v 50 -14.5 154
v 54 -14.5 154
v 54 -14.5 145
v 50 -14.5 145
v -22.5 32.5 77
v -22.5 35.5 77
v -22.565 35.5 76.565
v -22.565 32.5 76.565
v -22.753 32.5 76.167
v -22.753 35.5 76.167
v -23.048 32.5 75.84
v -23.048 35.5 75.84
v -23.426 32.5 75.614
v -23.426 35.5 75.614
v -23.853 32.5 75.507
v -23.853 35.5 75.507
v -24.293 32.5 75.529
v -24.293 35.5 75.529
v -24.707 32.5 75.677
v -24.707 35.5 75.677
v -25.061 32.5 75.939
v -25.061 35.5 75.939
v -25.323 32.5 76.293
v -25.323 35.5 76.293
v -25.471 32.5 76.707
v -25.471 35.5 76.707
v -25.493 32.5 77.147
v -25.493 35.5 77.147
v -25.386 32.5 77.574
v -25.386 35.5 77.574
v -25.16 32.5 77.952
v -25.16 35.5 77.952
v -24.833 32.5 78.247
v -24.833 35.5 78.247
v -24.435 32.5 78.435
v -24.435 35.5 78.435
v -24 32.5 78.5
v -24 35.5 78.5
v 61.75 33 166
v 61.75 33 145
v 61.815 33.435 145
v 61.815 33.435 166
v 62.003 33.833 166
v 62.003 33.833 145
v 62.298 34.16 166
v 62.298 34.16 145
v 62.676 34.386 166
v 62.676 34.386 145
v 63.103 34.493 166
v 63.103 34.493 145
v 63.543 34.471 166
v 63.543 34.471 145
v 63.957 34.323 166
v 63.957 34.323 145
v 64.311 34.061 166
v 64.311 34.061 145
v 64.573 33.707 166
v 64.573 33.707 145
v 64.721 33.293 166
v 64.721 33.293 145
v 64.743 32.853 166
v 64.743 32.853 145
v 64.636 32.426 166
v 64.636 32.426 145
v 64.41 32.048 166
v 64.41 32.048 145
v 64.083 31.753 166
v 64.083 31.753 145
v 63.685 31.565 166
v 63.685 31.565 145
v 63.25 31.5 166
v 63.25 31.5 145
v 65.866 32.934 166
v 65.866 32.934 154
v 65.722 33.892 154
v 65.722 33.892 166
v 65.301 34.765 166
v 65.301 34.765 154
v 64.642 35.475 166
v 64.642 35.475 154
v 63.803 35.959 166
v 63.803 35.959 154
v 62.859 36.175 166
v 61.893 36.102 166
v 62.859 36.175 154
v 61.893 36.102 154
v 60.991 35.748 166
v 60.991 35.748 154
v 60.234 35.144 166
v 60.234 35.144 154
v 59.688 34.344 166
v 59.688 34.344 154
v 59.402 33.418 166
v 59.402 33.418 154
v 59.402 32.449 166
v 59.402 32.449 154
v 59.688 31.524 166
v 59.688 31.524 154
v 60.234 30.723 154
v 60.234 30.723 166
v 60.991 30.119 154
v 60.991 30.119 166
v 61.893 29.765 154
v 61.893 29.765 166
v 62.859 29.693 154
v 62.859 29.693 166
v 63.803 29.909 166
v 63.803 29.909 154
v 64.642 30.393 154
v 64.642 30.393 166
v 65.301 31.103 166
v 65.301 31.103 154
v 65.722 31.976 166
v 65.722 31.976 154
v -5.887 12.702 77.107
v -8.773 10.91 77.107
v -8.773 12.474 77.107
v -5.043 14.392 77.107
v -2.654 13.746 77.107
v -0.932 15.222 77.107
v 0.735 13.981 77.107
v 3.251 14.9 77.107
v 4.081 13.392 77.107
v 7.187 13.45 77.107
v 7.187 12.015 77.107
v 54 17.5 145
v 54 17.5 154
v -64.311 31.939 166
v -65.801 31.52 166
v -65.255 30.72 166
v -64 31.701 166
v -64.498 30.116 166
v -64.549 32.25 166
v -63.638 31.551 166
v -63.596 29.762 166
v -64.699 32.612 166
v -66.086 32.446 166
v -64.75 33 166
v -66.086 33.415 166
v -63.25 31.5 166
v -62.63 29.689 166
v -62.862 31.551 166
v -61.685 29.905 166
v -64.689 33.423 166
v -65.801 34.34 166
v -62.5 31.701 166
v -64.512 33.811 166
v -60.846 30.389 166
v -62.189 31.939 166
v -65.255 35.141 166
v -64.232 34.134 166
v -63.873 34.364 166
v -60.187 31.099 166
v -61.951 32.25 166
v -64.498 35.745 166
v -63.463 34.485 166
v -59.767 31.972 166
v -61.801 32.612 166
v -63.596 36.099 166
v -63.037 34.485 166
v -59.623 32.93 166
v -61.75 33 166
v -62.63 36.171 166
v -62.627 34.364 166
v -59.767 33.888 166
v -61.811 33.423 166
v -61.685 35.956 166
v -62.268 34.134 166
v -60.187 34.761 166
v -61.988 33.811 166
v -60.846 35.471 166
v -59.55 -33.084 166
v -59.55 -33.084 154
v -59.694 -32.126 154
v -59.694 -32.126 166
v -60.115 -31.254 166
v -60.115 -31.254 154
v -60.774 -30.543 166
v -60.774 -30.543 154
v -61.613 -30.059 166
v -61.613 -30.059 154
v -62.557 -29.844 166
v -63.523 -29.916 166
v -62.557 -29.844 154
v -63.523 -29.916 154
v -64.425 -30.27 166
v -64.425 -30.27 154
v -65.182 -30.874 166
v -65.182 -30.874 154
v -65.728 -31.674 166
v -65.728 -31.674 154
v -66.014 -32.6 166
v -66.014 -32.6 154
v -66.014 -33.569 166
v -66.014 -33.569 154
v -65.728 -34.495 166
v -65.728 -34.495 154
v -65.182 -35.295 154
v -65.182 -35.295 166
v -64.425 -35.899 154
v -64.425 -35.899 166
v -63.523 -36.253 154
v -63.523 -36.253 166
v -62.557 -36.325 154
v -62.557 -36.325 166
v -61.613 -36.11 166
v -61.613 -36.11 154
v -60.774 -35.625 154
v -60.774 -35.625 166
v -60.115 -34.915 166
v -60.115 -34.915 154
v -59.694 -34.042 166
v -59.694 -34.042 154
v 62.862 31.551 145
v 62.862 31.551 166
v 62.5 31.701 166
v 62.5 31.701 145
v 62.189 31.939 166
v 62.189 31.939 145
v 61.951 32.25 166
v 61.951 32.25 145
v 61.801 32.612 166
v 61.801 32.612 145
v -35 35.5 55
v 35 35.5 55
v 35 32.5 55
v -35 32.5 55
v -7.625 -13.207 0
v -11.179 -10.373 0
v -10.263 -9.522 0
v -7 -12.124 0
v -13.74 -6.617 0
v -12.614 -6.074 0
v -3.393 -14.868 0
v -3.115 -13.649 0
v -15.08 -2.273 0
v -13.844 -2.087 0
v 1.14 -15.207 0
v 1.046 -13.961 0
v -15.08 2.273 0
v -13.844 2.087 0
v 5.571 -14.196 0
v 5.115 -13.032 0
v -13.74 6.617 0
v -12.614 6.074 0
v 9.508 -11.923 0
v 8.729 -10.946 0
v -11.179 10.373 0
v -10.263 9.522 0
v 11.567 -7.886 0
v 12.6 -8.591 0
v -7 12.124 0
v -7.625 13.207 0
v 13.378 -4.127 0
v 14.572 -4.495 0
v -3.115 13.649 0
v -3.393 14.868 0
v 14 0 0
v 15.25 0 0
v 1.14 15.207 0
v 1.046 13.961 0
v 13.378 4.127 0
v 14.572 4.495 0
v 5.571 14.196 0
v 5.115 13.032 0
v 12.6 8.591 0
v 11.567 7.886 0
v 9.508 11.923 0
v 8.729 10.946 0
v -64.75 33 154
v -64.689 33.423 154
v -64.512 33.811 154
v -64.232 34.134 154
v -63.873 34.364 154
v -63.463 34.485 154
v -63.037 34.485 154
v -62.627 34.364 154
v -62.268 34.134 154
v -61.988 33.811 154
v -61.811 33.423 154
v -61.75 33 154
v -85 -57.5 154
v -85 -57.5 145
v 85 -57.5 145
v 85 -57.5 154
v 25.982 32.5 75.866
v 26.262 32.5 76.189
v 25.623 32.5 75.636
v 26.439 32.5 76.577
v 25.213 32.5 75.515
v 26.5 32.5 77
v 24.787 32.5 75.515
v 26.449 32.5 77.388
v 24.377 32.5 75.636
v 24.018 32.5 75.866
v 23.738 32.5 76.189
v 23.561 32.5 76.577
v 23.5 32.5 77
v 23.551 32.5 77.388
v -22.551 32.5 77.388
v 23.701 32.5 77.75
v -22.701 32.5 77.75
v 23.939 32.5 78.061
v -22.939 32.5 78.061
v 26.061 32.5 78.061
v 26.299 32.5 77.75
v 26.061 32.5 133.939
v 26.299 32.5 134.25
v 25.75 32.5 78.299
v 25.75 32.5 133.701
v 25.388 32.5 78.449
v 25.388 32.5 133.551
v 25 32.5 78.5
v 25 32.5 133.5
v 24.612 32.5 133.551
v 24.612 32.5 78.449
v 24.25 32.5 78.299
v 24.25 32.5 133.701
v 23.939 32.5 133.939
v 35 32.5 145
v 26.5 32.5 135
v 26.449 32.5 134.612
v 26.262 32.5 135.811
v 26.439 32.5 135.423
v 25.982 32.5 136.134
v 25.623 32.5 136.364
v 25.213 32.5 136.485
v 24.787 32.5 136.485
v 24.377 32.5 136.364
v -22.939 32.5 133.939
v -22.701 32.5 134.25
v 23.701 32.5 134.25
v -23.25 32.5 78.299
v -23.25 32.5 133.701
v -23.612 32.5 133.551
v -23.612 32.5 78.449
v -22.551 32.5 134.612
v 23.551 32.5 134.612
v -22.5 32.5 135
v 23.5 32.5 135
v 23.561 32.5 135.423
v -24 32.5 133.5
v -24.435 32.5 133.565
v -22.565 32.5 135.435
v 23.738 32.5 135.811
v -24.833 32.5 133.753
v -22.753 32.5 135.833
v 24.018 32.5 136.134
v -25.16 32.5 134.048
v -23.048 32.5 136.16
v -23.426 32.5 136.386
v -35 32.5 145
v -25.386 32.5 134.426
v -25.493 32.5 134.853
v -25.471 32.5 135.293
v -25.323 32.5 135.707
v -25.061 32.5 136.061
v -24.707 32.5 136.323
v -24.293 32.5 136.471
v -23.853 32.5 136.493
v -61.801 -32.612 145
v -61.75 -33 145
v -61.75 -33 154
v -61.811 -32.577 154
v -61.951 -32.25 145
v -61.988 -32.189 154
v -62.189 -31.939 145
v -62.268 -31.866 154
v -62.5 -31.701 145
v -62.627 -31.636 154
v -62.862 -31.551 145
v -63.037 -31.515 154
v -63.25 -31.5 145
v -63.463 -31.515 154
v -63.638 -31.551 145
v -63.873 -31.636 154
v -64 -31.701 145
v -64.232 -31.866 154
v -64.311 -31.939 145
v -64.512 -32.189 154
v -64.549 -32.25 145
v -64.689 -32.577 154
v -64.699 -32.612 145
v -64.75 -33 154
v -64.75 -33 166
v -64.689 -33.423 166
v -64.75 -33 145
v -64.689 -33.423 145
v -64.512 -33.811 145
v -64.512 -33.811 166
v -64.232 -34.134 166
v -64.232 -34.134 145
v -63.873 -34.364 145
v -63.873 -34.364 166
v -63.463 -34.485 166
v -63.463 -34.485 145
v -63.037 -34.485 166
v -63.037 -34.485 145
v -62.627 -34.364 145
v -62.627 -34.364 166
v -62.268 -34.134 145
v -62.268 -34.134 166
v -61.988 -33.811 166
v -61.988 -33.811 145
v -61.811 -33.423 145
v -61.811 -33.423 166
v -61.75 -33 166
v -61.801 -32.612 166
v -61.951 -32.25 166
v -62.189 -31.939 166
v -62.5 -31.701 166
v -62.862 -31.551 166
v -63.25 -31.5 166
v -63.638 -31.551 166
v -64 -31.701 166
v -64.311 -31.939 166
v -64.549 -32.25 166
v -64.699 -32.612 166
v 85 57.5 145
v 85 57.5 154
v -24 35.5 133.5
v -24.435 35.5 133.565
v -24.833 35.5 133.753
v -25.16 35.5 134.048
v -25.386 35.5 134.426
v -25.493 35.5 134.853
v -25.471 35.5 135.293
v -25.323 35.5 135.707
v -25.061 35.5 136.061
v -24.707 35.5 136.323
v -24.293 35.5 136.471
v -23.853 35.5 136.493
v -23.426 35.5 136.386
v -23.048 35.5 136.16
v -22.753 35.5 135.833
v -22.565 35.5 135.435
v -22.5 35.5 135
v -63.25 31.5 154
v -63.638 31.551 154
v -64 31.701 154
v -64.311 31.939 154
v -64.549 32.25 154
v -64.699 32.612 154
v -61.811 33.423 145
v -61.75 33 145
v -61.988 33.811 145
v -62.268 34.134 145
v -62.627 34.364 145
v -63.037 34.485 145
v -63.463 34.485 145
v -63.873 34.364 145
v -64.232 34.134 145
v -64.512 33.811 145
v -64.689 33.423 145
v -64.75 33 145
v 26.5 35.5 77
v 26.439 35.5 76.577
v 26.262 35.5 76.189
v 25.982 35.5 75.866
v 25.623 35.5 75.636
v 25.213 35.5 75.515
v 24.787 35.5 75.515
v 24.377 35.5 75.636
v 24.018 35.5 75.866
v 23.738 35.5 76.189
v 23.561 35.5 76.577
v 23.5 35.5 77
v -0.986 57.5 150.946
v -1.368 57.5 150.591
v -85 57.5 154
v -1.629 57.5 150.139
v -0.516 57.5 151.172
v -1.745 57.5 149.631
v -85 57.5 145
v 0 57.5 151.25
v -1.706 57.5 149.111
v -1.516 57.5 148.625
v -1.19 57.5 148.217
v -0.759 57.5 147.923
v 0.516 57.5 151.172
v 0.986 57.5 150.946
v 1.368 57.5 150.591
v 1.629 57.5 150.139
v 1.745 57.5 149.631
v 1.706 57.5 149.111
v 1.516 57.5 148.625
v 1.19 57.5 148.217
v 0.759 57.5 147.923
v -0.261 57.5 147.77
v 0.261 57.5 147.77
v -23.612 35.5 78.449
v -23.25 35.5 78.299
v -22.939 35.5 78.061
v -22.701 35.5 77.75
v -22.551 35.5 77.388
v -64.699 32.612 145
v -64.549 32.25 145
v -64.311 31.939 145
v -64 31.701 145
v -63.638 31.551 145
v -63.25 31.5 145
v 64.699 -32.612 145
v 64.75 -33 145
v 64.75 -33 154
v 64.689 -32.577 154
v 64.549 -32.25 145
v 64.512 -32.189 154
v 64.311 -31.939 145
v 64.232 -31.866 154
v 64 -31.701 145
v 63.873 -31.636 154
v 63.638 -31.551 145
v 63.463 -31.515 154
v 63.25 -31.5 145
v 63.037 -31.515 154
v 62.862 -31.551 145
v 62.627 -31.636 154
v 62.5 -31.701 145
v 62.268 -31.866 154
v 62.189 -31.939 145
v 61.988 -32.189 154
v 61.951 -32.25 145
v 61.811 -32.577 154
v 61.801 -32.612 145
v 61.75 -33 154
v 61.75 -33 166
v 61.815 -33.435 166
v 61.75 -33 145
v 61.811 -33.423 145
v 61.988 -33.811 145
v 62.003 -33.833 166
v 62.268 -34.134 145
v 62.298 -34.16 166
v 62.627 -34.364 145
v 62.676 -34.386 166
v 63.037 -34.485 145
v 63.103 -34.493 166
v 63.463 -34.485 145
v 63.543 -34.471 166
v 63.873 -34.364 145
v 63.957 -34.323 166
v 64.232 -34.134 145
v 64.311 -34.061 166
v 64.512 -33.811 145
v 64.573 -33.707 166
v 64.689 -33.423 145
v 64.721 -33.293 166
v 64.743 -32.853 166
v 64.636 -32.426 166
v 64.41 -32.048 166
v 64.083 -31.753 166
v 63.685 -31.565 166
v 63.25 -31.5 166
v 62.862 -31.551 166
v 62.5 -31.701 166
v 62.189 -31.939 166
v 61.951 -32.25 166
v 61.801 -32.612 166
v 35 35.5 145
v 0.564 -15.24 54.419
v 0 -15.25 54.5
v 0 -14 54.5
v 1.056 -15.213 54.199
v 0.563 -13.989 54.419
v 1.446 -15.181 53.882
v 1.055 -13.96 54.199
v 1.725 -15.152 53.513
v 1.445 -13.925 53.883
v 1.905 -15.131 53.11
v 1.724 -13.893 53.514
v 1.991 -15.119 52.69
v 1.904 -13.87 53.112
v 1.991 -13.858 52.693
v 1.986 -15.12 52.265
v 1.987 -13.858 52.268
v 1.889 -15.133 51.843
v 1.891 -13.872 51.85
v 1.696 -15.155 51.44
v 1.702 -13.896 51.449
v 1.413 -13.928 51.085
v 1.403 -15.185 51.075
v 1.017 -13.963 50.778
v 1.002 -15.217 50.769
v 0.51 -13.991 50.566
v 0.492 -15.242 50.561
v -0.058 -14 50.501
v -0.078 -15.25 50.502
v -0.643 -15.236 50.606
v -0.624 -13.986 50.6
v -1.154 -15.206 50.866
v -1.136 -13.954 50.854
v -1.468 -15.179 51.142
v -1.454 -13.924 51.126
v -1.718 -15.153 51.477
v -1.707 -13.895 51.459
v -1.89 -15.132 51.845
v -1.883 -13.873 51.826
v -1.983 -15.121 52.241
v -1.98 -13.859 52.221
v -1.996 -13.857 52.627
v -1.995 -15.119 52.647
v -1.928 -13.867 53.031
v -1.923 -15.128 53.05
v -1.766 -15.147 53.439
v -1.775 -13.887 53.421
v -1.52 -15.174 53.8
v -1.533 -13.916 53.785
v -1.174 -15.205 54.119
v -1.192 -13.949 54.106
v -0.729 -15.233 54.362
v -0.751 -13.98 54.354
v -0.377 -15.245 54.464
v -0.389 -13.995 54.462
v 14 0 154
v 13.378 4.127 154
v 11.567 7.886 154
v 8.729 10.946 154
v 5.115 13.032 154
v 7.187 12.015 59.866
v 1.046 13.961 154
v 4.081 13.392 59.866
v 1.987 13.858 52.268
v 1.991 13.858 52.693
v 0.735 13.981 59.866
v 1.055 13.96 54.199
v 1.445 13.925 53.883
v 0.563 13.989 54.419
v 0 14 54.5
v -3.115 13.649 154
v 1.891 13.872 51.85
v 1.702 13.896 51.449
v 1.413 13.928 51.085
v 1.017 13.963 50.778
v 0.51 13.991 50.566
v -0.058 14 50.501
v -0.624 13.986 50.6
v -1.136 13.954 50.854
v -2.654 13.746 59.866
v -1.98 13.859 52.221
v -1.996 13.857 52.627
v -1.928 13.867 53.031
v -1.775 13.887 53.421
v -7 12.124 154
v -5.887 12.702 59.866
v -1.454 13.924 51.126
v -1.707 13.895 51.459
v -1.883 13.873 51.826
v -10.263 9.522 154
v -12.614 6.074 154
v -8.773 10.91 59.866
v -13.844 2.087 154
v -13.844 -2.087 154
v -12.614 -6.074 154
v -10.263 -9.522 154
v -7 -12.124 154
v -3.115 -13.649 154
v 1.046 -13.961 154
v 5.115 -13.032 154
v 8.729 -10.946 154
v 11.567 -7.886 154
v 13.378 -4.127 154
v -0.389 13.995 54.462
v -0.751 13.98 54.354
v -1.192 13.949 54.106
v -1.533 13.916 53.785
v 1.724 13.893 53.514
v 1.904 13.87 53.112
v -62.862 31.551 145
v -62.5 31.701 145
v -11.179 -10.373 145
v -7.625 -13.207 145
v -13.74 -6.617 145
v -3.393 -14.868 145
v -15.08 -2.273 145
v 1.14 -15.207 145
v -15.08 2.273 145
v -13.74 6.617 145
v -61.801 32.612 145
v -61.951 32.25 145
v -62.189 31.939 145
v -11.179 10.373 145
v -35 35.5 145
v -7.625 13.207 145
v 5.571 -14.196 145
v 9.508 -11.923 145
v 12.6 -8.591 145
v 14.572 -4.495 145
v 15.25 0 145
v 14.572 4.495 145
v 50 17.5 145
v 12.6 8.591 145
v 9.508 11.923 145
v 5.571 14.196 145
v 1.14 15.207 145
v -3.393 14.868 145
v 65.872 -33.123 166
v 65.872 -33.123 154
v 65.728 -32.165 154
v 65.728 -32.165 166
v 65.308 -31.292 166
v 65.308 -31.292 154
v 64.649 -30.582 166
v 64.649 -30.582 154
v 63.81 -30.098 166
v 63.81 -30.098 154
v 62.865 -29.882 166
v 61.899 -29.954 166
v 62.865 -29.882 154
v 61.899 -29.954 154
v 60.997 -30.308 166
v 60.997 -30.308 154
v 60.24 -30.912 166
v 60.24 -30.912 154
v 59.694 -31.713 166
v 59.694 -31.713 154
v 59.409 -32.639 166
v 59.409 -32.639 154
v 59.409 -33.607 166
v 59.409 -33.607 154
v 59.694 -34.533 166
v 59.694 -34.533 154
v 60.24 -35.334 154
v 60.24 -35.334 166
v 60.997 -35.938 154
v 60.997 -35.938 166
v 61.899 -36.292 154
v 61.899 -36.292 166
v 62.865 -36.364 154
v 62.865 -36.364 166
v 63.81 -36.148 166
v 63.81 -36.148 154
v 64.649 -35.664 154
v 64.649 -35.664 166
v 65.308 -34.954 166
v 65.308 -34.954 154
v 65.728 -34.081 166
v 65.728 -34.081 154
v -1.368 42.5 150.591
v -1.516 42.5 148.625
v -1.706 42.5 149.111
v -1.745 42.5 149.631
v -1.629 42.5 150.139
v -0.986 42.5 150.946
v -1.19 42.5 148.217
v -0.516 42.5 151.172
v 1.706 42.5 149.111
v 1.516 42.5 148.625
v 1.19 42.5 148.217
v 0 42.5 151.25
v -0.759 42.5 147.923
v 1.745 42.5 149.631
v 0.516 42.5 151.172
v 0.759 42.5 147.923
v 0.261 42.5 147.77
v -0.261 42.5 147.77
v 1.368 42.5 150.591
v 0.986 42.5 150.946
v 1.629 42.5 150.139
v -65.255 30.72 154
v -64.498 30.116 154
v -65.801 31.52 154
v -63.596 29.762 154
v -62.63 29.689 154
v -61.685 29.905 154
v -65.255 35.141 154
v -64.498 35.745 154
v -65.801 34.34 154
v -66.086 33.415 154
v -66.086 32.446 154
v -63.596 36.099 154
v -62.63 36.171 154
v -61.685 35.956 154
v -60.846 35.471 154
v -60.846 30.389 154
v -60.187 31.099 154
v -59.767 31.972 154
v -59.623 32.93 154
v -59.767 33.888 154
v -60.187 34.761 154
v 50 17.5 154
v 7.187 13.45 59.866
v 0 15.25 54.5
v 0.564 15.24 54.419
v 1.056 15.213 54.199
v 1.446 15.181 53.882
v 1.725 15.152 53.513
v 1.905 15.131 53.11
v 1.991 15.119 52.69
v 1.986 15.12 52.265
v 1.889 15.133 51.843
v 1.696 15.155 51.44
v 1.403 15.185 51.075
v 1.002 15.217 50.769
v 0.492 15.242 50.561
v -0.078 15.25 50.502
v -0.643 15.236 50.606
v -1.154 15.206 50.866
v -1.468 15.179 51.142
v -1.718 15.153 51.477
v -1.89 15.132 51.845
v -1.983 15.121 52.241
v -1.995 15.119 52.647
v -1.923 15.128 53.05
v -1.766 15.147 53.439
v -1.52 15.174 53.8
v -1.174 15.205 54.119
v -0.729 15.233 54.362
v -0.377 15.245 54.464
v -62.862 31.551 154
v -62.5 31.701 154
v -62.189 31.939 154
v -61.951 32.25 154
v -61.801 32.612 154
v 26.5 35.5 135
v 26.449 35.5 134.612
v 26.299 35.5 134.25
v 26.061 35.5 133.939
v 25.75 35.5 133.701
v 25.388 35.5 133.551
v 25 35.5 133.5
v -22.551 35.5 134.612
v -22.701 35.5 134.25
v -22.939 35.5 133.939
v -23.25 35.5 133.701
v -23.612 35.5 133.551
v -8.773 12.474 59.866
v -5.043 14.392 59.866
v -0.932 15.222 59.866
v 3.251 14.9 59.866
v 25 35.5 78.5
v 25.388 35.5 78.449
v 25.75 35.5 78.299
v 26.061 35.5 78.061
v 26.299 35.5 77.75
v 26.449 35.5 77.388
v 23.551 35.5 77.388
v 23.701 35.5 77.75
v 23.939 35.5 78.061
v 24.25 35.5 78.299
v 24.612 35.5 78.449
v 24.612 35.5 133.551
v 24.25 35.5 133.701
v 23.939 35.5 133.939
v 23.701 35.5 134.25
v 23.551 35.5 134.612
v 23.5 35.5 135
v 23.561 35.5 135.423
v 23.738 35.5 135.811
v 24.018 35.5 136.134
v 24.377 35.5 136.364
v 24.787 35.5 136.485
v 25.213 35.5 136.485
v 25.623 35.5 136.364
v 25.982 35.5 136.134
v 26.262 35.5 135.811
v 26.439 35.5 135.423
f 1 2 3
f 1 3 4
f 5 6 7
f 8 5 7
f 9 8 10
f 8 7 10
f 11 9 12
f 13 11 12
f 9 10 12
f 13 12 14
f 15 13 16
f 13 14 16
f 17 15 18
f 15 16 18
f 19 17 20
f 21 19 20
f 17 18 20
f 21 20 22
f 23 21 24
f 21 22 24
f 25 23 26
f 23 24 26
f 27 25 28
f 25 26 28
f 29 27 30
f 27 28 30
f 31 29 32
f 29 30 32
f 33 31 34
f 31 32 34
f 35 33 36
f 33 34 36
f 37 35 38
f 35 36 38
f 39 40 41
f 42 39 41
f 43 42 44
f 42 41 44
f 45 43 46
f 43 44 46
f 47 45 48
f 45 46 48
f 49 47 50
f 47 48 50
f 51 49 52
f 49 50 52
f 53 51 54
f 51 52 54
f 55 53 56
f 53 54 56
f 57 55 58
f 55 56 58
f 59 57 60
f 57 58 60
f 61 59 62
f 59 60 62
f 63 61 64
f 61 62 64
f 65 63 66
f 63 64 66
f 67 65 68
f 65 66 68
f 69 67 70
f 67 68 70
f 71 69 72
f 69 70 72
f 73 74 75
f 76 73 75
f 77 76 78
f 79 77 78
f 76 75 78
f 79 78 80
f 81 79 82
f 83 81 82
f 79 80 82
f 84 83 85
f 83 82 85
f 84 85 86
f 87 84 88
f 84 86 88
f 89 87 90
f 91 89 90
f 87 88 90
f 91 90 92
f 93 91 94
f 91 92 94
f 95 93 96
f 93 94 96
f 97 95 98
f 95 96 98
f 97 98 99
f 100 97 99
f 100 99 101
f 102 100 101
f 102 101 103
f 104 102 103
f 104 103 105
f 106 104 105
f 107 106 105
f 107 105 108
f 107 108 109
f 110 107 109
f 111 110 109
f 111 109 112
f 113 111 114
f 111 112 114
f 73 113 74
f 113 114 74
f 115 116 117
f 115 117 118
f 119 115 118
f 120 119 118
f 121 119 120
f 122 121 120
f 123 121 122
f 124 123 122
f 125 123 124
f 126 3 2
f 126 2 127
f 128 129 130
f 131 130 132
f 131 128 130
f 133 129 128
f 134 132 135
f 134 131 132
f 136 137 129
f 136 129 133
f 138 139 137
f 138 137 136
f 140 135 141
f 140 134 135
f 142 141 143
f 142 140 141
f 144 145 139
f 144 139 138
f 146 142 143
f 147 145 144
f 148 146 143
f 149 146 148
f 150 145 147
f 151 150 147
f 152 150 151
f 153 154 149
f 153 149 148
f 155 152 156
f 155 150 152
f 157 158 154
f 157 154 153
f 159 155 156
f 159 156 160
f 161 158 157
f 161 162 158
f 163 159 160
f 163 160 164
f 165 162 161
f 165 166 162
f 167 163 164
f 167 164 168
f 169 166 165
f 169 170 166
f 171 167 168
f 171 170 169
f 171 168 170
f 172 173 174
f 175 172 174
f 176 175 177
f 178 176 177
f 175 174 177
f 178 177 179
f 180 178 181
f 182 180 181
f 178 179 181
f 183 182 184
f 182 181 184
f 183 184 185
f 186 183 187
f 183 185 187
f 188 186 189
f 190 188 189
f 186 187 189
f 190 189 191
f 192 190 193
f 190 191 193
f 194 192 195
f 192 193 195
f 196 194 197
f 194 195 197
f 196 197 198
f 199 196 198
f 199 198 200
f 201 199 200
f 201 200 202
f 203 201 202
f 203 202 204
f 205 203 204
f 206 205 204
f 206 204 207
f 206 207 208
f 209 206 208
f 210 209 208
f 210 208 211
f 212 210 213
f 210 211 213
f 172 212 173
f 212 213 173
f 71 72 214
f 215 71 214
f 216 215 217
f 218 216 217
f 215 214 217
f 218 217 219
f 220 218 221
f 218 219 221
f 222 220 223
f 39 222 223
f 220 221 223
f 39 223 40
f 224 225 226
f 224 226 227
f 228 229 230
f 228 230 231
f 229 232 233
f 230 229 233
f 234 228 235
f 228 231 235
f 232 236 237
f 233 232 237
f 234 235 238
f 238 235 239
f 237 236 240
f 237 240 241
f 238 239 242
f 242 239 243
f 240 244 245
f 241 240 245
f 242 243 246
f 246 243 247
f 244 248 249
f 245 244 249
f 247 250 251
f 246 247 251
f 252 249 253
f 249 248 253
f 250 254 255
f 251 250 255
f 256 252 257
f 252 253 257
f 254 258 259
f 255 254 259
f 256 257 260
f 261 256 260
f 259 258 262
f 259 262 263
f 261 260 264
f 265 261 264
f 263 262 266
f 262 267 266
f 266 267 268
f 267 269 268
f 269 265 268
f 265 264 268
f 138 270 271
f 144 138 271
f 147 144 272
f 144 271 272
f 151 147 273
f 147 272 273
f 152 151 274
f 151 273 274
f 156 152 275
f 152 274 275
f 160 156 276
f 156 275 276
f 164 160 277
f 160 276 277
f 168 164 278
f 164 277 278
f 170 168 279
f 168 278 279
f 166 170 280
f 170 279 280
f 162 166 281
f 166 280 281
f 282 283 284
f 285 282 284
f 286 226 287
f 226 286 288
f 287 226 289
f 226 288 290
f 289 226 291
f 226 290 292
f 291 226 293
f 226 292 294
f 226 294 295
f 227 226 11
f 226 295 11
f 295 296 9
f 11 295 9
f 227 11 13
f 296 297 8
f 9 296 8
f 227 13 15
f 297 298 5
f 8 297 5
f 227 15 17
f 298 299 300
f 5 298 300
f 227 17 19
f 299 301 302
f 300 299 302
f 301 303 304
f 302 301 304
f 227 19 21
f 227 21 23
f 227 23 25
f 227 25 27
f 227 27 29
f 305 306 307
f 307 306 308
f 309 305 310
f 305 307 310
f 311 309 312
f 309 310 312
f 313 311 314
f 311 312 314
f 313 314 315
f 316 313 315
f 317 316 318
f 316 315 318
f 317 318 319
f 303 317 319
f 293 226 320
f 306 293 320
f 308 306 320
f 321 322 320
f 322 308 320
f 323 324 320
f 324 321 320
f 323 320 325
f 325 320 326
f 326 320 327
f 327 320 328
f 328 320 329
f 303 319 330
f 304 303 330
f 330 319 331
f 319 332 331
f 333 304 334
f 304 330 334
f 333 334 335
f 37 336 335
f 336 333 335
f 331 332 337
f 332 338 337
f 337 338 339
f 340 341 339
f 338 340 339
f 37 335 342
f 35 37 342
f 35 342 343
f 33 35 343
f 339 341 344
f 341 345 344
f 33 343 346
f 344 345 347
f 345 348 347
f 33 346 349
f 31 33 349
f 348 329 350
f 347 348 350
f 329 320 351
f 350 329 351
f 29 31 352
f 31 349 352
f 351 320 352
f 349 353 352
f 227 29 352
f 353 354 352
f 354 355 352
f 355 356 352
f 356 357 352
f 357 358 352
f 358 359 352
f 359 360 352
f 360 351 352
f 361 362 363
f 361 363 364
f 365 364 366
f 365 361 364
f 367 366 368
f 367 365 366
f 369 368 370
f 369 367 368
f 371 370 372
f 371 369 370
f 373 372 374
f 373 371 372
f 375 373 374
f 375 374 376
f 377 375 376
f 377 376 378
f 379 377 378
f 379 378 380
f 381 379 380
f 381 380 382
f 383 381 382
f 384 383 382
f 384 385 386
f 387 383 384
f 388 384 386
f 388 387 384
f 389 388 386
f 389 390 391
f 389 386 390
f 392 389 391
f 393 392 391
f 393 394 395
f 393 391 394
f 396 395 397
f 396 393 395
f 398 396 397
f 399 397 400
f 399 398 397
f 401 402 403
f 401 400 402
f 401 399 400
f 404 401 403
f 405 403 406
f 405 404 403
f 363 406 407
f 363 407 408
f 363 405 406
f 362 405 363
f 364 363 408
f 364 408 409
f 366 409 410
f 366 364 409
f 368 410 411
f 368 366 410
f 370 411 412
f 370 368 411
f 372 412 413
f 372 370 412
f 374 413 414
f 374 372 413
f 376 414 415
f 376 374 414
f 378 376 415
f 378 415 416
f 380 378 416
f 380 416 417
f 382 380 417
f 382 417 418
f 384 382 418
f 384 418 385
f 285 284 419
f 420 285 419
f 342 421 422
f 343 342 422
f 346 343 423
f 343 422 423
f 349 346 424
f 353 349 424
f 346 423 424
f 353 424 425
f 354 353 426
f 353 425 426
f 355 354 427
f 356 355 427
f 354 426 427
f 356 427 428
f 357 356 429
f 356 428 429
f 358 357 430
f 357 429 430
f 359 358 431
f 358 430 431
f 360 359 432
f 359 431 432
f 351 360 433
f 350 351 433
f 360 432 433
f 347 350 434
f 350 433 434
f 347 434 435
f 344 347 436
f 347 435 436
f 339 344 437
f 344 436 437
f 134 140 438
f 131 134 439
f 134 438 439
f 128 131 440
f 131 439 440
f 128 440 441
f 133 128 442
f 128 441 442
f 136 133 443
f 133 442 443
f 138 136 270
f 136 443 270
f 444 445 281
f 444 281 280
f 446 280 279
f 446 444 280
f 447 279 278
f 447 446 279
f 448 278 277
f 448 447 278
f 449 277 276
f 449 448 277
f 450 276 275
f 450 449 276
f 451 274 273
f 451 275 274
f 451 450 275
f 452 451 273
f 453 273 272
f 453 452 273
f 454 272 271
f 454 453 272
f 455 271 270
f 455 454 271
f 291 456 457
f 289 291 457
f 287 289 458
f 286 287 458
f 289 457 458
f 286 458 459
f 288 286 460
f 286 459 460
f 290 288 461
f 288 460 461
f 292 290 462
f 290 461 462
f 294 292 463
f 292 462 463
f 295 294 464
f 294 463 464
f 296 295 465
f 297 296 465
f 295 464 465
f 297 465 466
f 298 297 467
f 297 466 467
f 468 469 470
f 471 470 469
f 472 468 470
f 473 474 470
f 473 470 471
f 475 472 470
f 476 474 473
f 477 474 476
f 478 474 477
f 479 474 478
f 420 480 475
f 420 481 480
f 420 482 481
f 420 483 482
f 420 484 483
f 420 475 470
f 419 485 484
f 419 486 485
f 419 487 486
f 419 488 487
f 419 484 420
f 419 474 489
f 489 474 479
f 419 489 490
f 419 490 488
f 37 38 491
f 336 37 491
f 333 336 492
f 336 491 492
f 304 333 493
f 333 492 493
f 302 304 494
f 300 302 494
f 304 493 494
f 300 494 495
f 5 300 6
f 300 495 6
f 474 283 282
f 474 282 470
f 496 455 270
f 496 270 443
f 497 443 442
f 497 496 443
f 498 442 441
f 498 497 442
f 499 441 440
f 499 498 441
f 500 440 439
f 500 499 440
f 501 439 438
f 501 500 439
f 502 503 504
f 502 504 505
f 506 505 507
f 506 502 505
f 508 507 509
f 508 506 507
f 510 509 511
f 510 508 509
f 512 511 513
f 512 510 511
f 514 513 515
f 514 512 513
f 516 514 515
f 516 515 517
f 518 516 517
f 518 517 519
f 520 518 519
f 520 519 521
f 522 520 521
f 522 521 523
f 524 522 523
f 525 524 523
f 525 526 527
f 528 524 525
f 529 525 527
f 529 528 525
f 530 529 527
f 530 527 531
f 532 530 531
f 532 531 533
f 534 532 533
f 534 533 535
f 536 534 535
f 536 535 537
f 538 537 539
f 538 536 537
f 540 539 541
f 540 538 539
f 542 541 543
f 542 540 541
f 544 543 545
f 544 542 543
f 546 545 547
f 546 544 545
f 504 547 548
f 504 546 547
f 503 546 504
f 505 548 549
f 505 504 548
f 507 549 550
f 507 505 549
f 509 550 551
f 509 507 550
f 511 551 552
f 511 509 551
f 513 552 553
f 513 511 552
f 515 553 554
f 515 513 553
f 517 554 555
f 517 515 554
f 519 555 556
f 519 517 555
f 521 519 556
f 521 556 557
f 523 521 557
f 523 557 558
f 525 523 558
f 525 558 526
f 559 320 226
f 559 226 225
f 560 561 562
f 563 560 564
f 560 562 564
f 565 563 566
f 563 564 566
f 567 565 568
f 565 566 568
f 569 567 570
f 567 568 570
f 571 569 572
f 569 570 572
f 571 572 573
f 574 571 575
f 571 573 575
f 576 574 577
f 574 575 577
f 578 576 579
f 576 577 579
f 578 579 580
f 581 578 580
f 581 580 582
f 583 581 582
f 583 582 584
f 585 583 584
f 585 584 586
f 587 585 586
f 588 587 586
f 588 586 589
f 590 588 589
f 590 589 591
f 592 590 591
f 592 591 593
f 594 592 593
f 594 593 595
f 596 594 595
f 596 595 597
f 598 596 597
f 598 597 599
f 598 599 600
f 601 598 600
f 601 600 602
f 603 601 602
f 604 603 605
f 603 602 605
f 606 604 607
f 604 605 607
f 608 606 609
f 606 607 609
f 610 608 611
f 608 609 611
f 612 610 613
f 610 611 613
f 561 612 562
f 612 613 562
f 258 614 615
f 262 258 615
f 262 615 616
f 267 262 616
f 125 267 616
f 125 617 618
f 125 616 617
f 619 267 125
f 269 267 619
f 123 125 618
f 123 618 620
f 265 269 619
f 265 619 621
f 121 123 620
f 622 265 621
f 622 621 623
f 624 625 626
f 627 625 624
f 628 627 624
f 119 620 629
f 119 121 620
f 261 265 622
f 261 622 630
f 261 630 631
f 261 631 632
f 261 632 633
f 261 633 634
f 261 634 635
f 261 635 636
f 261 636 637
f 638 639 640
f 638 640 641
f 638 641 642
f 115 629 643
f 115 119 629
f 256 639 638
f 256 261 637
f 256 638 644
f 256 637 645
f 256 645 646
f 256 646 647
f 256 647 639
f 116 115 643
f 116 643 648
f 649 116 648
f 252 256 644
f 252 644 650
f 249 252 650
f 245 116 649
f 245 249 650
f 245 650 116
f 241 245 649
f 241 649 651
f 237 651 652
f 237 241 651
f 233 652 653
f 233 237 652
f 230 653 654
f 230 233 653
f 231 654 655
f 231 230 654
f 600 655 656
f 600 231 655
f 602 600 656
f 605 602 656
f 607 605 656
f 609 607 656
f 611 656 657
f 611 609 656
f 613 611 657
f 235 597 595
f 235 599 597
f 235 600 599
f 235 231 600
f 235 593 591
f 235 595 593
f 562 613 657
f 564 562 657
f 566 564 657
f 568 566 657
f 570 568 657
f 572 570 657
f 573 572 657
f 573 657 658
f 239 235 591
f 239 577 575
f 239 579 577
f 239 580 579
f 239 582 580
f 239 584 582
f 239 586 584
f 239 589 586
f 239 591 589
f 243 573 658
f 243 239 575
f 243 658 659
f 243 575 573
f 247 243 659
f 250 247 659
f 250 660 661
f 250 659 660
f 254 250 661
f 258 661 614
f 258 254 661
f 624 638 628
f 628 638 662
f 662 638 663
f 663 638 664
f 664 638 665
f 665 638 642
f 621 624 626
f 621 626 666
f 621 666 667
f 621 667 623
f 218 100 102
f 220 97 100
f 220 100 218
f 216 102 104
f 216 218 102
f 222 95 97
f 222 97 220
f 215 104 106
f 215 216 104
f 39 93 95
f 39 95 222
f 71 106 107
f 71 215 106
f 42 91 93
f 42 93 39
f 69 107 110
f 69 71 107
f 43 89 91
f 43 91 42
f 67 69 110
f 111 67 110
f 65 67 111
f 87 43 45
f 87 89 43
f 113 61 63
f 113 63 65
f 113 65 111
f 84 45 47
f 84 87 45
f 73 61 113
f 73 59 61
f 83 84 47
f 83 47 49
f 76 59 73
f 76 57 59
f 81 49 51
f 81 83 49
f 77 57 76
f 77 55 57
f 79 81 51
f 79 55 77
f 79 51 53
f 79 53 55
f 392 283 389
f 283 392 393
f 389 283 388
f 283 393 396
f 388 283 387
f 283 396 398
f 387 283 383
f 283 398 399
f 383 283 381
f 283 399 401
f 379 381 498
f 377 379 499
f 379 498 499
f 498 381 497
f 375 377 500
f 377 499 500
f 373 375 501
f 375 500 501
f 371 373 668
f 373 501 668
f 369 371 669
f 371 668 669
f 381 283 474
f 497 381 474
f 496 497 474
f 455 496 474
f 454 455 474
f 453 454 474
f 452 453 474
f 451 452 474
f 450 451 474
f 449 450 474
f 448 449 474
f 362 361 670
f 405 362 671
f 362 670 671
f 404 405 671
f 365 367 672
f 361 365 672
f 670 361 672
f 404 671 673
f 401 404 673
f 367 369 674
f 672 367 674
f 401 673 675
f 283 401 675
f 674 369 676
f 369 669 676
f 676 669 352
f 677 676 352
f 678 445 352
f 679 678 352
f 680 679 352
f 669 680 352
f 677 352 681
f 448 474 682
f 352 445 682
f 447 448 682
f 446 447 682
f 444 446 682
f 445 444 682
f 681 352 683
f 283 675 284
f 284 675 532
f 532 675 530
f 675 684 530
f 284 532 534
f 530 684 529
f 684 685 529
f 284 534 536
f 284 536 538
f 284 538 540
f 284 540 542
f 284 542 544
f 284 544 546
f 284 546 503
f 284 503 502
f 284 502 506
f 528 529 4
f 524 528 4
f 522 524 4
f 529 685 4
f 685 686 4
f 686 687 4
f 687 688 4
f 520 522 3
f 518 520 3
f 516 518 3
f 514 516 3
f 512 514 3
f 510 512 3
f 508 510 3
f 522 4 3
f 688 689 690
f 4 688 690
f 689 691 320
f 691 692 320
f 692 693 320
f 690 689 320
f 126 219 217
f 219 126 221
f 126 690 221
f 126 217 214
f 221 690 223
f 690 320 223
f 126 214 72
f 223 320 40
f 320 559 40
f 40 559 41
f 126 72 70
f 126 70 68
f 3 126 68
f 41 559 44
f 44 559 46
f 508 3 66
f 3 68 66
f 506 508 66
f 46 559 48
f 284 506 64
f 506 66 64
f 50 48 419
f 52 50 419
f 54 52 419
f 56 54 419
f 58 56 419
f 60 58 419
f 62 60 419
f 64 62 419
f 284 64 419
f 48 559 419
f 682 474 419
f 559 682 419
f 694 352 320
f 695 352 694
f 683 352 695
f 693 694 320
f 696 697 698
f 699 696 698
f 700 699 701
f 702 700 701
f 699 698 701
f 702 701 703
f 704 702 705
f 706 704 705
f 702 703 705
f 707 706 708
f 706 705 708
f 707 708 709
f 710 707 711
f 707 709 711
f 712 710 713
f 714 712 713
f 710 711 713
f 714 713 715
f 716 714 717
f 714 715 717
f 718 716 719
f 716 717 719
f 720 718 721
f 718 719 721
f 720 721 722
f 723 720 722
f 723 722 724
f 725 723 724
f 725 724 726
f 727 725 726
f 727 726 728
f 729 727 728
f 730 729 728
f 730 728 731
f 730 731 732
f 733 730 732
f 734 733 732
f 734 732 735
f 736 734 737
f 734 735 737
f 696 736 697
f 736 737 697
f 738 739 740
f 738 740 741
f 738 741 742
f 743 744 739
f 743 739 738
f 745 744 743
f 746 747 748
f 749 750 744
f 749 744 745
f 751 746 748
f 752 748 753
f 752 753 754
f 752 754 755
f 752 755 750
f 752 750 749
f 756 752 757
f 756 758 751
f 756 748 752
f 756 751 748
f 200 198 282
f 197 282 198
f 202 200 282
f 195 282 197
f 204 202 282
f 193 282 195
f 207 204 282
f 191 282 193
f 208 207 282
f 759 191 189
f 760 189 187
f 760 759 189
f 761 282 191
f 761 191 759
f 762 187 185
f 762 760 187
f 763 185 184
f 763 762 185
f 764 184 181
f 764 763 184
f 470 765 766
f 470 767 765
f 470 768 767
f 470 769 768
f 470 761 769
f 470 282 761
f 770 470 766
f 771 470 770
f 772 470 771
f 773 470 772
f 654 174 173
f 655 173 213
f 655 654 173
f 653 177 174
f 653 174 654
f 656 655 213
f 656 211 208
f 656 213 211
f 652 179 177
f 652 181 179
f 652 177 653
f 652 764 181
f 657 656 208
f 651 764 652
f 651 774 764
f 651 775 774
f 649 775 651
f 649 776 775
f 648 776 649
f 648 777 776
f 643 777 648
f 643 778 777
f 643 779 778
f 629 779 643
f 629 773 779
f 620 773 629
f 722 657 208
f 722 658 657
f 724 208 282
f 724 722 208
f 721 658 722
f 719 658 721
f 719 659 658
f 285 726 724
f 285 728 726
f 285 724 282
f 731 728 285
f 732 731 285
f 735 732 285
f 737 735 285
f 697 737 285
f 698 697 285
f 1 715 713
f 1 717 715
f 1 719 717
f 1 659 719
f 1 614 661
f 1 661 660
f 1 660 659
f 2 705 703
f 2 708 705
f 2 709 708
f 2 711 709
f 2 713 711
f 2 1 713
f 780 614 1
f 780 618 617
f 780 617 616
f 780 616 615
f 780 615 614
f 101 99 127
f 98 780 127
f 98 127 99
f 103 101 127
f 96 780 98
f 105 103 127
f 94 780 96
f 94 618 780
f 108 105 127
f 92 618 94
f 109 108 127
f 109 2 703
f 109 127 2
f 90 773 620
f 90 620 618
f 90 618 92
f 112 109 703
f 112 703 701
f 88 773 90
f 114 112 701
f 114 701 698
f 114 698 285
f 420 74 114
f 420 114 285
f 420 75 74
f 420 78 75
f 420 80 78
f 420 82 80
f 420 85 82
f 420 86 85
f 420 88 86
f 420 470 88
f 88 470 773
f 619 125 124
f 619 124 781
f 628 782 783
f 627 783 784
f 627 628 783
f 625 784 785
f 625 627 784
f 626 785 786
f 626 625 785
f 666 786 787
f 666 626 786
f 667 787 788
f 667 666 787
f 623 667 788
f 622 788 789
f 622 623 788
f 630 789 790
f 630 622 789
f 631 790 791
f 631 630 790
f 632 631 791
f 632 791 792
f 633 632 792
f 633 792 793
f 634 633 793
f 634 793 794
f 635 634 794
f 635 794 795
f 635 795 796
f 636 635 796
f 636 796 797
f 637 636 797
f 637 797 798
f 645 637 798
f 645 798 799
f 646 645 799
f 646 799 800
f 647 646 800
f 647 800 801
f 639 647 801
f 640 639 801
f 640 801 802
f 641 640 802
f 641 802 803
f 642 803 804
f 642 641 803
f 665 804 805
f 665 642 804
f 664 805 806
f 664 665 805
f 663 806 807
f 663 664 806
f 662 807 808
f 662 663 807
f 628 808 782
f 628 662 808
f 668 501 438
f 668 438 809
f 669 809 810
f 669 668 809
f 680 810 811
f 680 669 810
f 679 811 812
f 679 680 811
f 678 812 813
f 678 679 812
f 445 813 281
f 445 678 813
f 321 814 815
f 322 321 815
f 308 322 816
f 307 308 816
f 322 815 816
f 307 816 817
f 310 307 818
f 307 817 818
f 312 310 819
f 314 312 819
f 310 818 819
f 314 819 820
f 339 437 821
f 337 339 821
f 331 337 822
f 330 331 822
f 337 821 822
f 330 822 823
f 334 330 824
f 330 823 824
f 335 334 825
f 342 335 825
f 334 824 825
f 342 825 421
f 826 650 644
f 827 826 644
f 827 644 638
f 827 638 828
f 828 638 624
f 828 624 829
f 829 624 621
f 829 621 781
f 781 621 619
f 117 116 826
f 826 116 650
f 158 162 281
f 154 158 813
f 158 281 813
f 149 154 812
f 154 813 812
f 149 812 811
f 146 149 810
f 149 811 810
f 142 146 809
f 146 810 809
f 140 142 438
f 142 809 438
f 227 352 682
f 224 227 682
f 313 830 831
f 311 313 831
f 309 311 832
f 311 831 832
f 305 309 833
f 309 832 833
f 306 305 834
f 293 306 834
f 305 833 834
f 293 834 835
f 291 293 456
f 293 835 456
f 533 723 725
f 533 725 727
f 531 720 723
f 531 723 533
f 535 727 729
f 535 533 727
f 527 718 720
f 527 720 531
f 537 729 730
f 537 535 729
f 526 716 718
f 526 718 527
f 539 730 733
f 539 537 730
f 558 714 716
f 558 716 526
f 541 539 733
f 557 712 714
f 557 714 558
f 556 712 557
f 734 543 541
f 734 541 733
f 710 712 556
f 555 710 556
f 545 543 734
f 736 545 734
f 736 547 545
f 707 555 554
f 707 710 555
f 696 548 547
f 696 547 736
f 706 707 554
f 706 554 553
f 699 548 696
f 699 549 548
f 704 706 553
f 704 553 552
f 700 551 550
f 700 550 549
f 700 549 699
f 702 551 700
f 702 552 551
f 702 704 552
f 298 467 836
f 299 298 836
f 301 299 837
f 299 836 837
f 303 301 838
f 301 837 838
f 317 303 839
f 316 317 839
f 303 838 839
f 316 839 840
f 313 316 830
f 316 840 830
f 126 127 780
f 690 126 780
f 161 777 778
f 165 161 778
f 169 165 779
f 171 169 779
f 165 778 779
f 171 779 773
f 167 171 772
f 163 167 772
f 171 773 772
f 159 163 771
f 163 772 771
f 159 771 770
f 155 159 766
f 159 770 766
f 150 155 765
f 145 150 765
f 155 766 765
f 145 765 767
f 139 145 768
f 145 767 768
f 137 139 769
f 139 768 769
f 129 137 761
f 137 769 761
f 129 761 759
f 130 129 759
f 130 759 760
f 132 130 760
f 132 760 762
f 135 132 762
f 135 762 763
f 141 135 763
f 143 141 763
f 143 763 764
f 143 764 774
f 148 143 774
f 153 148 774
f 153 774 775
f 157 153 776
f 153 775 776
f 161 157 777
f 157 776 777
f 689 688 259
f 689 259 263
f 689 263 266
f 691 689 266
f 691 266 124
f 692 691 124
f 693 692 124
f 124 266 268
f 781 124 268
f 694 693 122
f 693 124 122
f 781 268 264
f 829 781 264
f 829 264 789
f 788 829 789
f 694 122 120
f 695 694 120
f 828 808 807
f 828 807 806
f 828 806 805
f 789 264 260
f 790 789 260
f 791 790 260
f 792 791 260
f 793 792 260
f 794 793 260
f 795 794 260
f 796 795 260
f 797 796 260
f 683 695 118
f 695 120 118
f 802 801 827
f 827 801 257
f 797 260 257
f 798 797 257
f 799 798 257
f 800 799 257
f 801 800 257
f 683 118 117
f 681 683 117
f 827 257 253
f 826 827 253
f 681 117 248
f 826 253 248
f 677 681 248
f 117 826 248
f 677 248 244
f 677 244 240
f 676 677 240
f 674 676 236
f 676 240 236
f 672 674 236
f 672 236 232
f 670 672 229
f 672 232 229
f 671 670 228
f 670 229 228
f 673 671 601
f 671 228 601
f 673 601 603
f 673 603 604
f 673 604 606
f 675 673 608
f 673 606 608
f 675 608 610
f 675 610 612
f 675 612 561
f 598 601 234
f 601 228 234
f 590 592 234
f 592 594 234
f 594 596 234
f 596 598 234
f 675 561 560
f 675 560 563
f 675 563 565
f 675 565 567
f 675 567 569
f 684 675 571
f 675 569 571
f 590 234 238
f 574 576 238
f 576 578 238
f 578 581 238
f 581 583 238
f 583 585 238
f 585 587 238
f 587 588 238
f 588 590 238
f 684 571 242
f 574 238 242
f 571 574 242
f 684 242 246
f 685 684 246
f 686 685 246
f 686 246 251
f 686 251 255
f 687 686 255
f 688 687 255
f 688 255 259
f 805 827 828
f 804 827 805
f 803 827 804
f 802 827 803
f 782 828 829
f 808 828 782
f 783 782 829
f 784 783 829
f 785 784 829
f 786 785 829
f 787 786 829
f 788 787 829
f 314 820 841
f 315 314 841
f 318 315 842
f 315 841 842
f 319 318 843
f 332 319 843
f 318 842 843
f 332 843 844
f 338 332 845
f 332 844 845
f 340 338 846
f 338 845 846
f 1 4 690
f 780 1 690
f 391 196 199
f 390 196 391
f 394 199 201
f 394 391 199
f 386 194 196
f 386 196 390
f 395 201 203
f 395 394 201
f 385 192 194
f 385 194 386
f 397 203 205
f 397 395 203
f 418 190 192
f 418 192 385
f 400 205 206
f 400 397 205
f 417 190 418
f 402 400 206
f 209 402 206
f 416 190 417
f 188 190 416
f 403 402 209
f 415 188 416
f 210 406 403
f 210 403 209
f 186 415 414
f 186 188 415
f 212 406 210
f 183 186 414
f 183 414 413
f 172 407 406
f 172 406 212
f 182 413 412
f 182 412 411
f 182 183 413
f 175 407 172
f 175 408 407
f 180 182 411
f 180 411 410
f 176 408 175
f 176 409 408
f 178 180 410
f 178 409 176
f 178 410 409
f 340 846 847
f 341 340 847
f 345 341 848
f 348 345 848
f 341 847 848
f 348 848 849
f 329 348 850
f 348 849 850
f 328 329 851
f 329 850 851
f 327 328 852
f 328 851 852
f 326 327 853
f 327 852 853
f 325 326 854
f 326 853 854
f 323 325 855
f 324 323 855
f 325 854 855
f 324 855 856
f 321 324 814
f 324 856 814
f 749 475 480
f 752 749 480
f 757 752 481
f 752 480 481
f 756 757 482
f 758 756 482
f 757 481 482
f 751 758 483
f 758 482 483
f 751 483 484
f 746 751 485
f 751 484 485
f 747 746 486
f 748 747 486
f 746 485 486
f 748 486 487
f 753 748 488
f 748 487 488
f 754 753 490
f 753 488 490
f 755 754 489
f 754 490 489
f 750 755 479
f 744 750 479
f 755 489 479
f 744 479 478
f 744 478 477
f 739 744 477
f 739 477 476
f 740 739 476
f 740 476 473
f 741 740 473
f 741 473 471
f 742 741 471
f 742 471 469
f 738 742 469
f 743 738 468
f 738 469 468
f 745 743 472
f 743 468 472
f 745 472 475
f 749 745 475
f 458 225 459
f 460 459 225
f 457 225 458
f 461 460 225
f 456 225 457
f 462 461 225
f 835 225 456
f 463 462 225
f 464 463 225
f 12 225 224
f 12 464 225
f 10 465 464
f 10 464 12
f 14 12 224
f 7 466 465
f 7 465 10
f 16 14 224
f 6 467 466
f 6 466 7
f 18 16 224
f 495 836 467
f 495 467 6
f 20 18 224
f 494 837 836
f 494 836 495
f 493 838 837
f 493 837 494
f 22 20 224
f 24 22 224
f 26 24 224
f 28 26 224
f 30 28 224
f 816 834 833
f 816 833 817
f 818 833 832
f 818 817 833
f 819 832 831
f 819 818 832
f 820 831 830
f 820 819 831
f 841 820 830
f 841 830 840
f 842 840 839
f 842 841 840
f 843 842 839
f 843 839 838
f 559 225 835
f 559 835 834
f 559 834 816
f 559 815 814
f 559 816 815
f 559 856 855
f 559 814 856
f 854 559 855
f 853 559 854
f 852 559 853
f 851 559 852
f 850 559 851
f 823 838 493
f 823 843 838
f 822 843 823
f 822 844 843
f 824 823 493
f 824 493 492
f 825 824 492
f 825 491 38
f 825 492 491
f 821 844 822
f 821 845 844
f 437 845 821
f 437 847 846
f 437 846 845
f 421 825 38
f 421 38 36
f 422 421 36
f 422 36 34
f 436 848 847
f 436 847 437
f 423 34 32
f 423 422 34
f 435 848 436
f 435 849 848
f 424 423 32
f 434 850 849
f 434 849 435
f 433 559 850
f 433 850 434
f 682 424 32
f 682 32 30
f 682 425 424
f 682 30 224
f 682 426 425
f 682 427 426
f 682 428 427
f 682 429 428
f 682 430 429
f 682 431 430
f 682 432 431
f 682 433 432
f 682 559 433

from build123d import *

# Parameters (mm, degrees)
ESQUISSE1_R                         = 15.25
ESQUISSE1_R_2                       = 13.5
BOSS_EXTRU_1_DEPTH                  = 145
ENL_V_MAT_EXTRU_1_REACH             = 148.595
ESQUISSE4_R                         = 2
ENL_V_MAT_EXTRU_1_DIRECTION_2_DEPTH = 147.595105648
ESQUISSE5_W                         = 170
ESQUISSE5_H                         = 115
BOSS_EXTRU_2_DEPTH                  = 9
ESQUISSE14_R                        = 14
ENL_V_MAT_EXTRU_2_DEPTH             = 186.060125365
ENL_V_MAT_EXTRU_3_DEPTH             = 186.060125448
ENL_V_MAT_EXTRU_3_DEPTH_BACK        = 186.060125448
ESQUISSE15_R                        = 1.5
ESQUISSE16_R                        = 1.75
ENL_V_MAT_EXTRU_4_DEPTH             = 15
ESQUISSE22_W                        = 70
ESQUISSE22_H                        = 3
BOSS_EXTRU_11_DEPTH                 = 90
ENL_V_MAT_EXTRU_6_DEPTH             = 90
ESQUISSE25_W                        = 4
ESQUISSE25_H                        = 32
ENL_V_MAT_EXTRU_7_DEPTH             = 90
ENL_V_MAT_EXTRU_8_REACH             = 187.06
ENL_V_MAT_EXTRU_8_END_RADIUS        = 15.25
ESQUISSE26_W                        = 15.960277927
ESQUISSE26_H                        = 17.240886996
ESQUISSE27_R                        = 3.25
BOSS_EXTRU_12_DEPTH                 = 12
ENL_V_MAT_EXTRU_9_DEPTH             = 178.640789317


with BuildPart() as part:
    # Esquisse1 → Boss.-Extru.1 (new body)
    with BuildSketch(Plane.XY):
        Circle(ESQUISSE1_R)
        Circle(ESQUISSE1_R_2, mode=Mode.SUBTRACT)
    extrude(amount=BOSS_EXTRU_1_DEPTH)

    # Esquisse4 → Enlèv. mat.-Extru.1 (cut, up to next)
    with BuildSketch(Plane(origin=(0, 0, 0), x_dir=(1, 0, 0), z_dir=(0, 1, 0)), mode=Mode.PRIVATE) as enl_v_mat_extru_1_sk1:
        with Locations(Location((0, -52.5, 0), (0, 0, 270))):
            Circle(ESQUISSE4_R)
    enl_v_mat_extru_1_tool1 = extrude(enl_v_mat_extru_1_sk1.sketch, amount=-ENL_V_MAT_EXTRU_1_REACH, mode=Mode.PRIVATE) & part.part
    add(enl_v_mat_extru_1_tool1.solids().sort_by_distance((0, 0, 52.5))[0], mode=Mode.SUBTRACT)

    # Esquisse4 → Enlèv. mat.-Extru.1 direction 2 (cut)
    with BuildSketch(Plane(origin=(0, 0, 0), x_dir=(1, 0, 0), z_dir=(0, 1, 0))):
        with Locations(Location((0, -52.5, 0), (0, 0, 270))):
            Circle(ESQUISSE4_R)
    extrude(amount=ENL_V_MAT_EXTRU_1_DIRECTION_2_DEPTH, mode=Mode.SUBTRACT)

    # Esquisse5 → Boss.-Extru.2 (add)
    with BuildSketch(Plane.XY.offset(145)):
        Rectangle(ESQUISSE5_W, ESQUISSE5_H)
    extrude(amount=BOSS_EXTRU_2_DEPTH)

    # Esquisse14 → Enlèv. mat.-Extru.2 (cut, through all)
    with BuildSketch(Plane.XY):
        Circle(ESQUISSE14_R)
    extrude(amount=ENL_V_MAT_EXTRU_2_DEPTH, mode=Mode.SUBTRACT)

    # Esquisse15 → Enlèv. mat.-Extru.3 (cut, two sides: drawn at the far end of the back side and taken through both)
    with BuildSketch(Plane.XY.offset(154).offset(-ENL_V_MAT_EXTRU_3_DEPTH_BACK)):
        with Locations((-63.25, 33)):
            Circle(ESQUISSE15_R)
        with Locations((63.25, 33)):
            Circle(ESQUISSE15_R)
        with Locations((63.25, -33)):
            Circle(ESQUISSE15_R)
        with Locations((-63.25, -33)):
            Circle(ESQUISSE15_R)
    extrude(amount=ENL_V_MAT_EXTRU_3_DEPTH + ENL_V_MAT_EXTRU_3_DEPTH_BACK, mode=Mode.SUBTRACT)

    # Esquisse16 → Enlèv. mat.-Extru.4 (cut)
    with BuildSketch(Plane(origin=(0, 57.5, 0), x_dir=(1, 0, 0), z_dir=(0, 1, 0))):
        with Locations(Location((0, -149.5, 0), (0, 0, 270))):
            Circle(ESQUISSE16_R)
    extrude(amount=-ENL_V_MAT_EXTRU_4_DEPTH, mode=Mode.SUBTRACT)

    # Esquisse22 → Boss.-Extru.11 (add)
    with BuildSketch(Plane(origin=(0, 0, 145), x_dir=(-1, 0, 0), z_dir=(0, 0, -1))):
        with Locations((0, 34)):
            Rectangle(ESQUISSE22_W, ESQUISSE22_H)
    extrude(amount=BOSS_EXTRU_11_DEPTH)

    # Esquisse23 → Enlèv. mat.-Extru.6 (cut)
    with BuildSketch(Plane(origin=(0, 35.5, 0), x_dir=(1, 0, 0), z_dir=(0, 1, 0))):
        with BuildLine():
            ThreePointArc((26.5, -135), (26.060660172, -133.939339828), (25, -133.5))
            Line((25, -133.5), (25, -135))
            Line((25, -135), (23.5, -135))
            ThreePointArc((23.5, -135), (25, -136.5), (26.5, -135))
        make_face()
        with BuildLine():
            Line((25, -135), (25, -133.5))
            ThreePointArc((25, -133.5), (23.939339828, -133.939339828), (23.5, -135))
            Line((23.5, -135), (25, -135))
        make_face()
        with BuildLine():
            ThreePointArc((-22.5, -135), (-22.939339828, -133.939339828), (-24, -133.5))
            Line((-24, -133.5), (-24, -135))
            Line((-24, -135), (-22.5, -135))
        make_face()
        with BuildLine():
            Line((-24, -135), (-24, -133.5))
            ThreePointArc((-24, -133.5), (-25.060660172, -136.060660172), (-22.5, -135))
            Line((-22.5, -135), (-24, -135))
        make_face()
        with BuildLine():
            ThreePointArc((26.5, -77), (25, -75.5), (23.5, -77))
            Line((23.5, -77), (25, -77))
            Line((25, -77), (25, -78.5))
            ThreePointArc((25, -78.5), (26.060660172, -78.060660172), (26.5, -77))
        make_face()
        with BuildLine():
            Line((25, -77), (23.5, -77))
            ThreePointArc((23.5, -77), (23.939339828, -78.060660172), (25, -78.5))
            Line((25, -78.5), (25, -77))
        make_face()
        with BuildLine():
            ThreePointArc((-24, -78.5), (-22.939339828, -78.060660172), (-22.5, -77))
            Line((-22.5, -77), (-24, -77))
            Line((-24, -77), (-24, -78.5))
        make_face()
        with BuildLine():
            Line((-24, -77), (-22.5, -77))
            ThreePointArc((-22.5, -77), (-25.060660172, -75.939339828), (-24, -78.5))
            Line((-24, -78.5), (-24, -77))
        make_face()
    extrude(amount=-ENL_V_MAT_EXTRU_6_DEPTH, mode=Mode.SUBTRACT)

    # Esquisse25 → Enlèv. mat.-Extru.7 (cut)
    with BuildSketch(Plane(origin=(0, 0, 145), x_dir=(-1, 0, 0), z_dir=(0, 0, -1))):
        with Locations((-52, 1.5)):
            Rectangle(ESQUISSE25_W, ESQUISSE25_H)
    extrude(amount=-ENL_V_MAT_EXTRU_7_DEPTH, mode=Mode.SUBTRACT)

    # Enlèv. mat.-Extru.8: up to this cylinder (the profile starts inside it)
    enl_v_mat_extru_8_end = Plane(origin=(0, 0, 68.486818), z_dir=(0, 0, -1)) * Cylinder(ENL_V_MAT_EXTRU_8_END_RADIUS, 405.62, mode=Mode.PRIVATE)
    # Esquisse26 → Enlèv. mat.-Extru.8 (cut, up to the surface)
    with BuildSketch(Plane(origin=(0, 0, 0), x_dir=(1, 0, 0), z_dir=(0, 1, 0)), mode=Mode.PRIVATE) as enl_v_mat_extru_8_sk1:
        with Locations((-0.793346945, -68.486817672)):
            Rectangle(ESQUISSE26_W, ESQUISSE26_H)
    enl_v_mat_extru_8_tool1 = extrude(enl_v_mat_extru_8_sk1.sketch, amount=ENL_V_MAT_EXTRU_8_REACH, mode=Mode.PRIVATE) & enl_v_mat_extru_8_end
    add(enl_v_mat_extru_8_tool1.solids().sort_by_distance((-0.793347, 0, 68.486818))[0], mode=Mode.SUBTRACT)

    # Esquisse27 → Boss.-Extru.12 (add)
    with BuildSketch(Plane.XY.offset(154)):
        with Locations((62.616003653, 32.933842855)):
            Circle(ESQUISSE27_R)
        with Locations((62.622273681, -33.123005587)):
            Circle(ESQUISSE27_R)
        with Locations((-62.800064313, -33.084450181)):
            Circle(ESQUISSE27_R)
        with Locations((-62.872546265, 32.930245113)):
            Circle(ESQUISSE27_R)
    extrude(amount=BOSS_EXTRU_12_DEPTH)

    # Esquisse29 → Enlèv. mat.-Extru.9 (cut, through all)
    with BuildSketch(Plane(origin=(0, 0, 145), x_dir=(-1, 0, 0), z_dir=(0, 0, -1))):
        with BuildLine():
            ThreePointArc((64.75, 33), (63.25, 34.5), (61.75, 33))
            Line((61.75, 33), (63.25, 33))
            Line((63.25, 33), (63.25, 31.5))
            ThreePointArc((63.25, 31.5), (64.310660172, 31.939339828), (64.75, 33))
        make_face()
        with BuildLine():
            Line((63.25, 33), (61.75, 33))
            ThreePointArc((61.75, 33), (62.189339828, 31.939339828), (63.25, 31.5))
            Line((63.25, 31.5), (63.25, 33))
        make_face()
        with BuildLine():
            ThreePointArc((64.75, -33), (64.310660172, -31.939339828), (63.25, -31.5))
            Line((63.25, -31.5), (63.25, -33))
            Line((63.25, -33), (61.75, -33))
            ThreePointArc((61.75, -33), (63.25, -34.5), (64.75, -33))
        make_face()
        with BuildLine():
            Line((63.25, -33), (63.25, -31.5))
            ThreePointArc((63.25, -31.5), (62.189339828, -31.939339828), (61.75, -33))
            Line((61.75, -33), (63.25, -33))
        make_face()
        with BuildLine():
            Line((-63.25, 31.5), (-63.25, 33))
            Line((-63.25, 33), (-61.75, 33))
            ThreePointArc((-61.75, 33), (-64.310660172, 34.060660172), (-63.25, 31.5))
        make_face()
        with BuildLine():
            Line((-61.75, 33), (-63.25, 33))
            Line((-63.25, 33), (-63.25, 31.5))
            ThreePointArc((-63.25, 31.5), (-62.189339828, 31.939339828), (-61.75, 33))
        make_face()
        with BuildLine():
            ThreePointArc((-61.75, -33), (-62.189339828, -31.939339828), (-63.25, -31.5))
            Line((-63.25, -31.5), (-63.25, -33))
            Line((-63.25, -33), (-61.75, -33))
        make_face()
        with BuildLine():
            Line((-63.25, -33), (-63.25, -31.5))
            ThreePointArc((-63.25, -31.5), (-64.310660172, -34.060660172), (-61.75, -33))
            Line((-61.75, -33), (-63.25, -33))
        make_face()
    extrude(amount=-ENL_V_MAT_EXTRU_9_DEPTH, mode=Mode.SUBTRACT)


solid = part.part
